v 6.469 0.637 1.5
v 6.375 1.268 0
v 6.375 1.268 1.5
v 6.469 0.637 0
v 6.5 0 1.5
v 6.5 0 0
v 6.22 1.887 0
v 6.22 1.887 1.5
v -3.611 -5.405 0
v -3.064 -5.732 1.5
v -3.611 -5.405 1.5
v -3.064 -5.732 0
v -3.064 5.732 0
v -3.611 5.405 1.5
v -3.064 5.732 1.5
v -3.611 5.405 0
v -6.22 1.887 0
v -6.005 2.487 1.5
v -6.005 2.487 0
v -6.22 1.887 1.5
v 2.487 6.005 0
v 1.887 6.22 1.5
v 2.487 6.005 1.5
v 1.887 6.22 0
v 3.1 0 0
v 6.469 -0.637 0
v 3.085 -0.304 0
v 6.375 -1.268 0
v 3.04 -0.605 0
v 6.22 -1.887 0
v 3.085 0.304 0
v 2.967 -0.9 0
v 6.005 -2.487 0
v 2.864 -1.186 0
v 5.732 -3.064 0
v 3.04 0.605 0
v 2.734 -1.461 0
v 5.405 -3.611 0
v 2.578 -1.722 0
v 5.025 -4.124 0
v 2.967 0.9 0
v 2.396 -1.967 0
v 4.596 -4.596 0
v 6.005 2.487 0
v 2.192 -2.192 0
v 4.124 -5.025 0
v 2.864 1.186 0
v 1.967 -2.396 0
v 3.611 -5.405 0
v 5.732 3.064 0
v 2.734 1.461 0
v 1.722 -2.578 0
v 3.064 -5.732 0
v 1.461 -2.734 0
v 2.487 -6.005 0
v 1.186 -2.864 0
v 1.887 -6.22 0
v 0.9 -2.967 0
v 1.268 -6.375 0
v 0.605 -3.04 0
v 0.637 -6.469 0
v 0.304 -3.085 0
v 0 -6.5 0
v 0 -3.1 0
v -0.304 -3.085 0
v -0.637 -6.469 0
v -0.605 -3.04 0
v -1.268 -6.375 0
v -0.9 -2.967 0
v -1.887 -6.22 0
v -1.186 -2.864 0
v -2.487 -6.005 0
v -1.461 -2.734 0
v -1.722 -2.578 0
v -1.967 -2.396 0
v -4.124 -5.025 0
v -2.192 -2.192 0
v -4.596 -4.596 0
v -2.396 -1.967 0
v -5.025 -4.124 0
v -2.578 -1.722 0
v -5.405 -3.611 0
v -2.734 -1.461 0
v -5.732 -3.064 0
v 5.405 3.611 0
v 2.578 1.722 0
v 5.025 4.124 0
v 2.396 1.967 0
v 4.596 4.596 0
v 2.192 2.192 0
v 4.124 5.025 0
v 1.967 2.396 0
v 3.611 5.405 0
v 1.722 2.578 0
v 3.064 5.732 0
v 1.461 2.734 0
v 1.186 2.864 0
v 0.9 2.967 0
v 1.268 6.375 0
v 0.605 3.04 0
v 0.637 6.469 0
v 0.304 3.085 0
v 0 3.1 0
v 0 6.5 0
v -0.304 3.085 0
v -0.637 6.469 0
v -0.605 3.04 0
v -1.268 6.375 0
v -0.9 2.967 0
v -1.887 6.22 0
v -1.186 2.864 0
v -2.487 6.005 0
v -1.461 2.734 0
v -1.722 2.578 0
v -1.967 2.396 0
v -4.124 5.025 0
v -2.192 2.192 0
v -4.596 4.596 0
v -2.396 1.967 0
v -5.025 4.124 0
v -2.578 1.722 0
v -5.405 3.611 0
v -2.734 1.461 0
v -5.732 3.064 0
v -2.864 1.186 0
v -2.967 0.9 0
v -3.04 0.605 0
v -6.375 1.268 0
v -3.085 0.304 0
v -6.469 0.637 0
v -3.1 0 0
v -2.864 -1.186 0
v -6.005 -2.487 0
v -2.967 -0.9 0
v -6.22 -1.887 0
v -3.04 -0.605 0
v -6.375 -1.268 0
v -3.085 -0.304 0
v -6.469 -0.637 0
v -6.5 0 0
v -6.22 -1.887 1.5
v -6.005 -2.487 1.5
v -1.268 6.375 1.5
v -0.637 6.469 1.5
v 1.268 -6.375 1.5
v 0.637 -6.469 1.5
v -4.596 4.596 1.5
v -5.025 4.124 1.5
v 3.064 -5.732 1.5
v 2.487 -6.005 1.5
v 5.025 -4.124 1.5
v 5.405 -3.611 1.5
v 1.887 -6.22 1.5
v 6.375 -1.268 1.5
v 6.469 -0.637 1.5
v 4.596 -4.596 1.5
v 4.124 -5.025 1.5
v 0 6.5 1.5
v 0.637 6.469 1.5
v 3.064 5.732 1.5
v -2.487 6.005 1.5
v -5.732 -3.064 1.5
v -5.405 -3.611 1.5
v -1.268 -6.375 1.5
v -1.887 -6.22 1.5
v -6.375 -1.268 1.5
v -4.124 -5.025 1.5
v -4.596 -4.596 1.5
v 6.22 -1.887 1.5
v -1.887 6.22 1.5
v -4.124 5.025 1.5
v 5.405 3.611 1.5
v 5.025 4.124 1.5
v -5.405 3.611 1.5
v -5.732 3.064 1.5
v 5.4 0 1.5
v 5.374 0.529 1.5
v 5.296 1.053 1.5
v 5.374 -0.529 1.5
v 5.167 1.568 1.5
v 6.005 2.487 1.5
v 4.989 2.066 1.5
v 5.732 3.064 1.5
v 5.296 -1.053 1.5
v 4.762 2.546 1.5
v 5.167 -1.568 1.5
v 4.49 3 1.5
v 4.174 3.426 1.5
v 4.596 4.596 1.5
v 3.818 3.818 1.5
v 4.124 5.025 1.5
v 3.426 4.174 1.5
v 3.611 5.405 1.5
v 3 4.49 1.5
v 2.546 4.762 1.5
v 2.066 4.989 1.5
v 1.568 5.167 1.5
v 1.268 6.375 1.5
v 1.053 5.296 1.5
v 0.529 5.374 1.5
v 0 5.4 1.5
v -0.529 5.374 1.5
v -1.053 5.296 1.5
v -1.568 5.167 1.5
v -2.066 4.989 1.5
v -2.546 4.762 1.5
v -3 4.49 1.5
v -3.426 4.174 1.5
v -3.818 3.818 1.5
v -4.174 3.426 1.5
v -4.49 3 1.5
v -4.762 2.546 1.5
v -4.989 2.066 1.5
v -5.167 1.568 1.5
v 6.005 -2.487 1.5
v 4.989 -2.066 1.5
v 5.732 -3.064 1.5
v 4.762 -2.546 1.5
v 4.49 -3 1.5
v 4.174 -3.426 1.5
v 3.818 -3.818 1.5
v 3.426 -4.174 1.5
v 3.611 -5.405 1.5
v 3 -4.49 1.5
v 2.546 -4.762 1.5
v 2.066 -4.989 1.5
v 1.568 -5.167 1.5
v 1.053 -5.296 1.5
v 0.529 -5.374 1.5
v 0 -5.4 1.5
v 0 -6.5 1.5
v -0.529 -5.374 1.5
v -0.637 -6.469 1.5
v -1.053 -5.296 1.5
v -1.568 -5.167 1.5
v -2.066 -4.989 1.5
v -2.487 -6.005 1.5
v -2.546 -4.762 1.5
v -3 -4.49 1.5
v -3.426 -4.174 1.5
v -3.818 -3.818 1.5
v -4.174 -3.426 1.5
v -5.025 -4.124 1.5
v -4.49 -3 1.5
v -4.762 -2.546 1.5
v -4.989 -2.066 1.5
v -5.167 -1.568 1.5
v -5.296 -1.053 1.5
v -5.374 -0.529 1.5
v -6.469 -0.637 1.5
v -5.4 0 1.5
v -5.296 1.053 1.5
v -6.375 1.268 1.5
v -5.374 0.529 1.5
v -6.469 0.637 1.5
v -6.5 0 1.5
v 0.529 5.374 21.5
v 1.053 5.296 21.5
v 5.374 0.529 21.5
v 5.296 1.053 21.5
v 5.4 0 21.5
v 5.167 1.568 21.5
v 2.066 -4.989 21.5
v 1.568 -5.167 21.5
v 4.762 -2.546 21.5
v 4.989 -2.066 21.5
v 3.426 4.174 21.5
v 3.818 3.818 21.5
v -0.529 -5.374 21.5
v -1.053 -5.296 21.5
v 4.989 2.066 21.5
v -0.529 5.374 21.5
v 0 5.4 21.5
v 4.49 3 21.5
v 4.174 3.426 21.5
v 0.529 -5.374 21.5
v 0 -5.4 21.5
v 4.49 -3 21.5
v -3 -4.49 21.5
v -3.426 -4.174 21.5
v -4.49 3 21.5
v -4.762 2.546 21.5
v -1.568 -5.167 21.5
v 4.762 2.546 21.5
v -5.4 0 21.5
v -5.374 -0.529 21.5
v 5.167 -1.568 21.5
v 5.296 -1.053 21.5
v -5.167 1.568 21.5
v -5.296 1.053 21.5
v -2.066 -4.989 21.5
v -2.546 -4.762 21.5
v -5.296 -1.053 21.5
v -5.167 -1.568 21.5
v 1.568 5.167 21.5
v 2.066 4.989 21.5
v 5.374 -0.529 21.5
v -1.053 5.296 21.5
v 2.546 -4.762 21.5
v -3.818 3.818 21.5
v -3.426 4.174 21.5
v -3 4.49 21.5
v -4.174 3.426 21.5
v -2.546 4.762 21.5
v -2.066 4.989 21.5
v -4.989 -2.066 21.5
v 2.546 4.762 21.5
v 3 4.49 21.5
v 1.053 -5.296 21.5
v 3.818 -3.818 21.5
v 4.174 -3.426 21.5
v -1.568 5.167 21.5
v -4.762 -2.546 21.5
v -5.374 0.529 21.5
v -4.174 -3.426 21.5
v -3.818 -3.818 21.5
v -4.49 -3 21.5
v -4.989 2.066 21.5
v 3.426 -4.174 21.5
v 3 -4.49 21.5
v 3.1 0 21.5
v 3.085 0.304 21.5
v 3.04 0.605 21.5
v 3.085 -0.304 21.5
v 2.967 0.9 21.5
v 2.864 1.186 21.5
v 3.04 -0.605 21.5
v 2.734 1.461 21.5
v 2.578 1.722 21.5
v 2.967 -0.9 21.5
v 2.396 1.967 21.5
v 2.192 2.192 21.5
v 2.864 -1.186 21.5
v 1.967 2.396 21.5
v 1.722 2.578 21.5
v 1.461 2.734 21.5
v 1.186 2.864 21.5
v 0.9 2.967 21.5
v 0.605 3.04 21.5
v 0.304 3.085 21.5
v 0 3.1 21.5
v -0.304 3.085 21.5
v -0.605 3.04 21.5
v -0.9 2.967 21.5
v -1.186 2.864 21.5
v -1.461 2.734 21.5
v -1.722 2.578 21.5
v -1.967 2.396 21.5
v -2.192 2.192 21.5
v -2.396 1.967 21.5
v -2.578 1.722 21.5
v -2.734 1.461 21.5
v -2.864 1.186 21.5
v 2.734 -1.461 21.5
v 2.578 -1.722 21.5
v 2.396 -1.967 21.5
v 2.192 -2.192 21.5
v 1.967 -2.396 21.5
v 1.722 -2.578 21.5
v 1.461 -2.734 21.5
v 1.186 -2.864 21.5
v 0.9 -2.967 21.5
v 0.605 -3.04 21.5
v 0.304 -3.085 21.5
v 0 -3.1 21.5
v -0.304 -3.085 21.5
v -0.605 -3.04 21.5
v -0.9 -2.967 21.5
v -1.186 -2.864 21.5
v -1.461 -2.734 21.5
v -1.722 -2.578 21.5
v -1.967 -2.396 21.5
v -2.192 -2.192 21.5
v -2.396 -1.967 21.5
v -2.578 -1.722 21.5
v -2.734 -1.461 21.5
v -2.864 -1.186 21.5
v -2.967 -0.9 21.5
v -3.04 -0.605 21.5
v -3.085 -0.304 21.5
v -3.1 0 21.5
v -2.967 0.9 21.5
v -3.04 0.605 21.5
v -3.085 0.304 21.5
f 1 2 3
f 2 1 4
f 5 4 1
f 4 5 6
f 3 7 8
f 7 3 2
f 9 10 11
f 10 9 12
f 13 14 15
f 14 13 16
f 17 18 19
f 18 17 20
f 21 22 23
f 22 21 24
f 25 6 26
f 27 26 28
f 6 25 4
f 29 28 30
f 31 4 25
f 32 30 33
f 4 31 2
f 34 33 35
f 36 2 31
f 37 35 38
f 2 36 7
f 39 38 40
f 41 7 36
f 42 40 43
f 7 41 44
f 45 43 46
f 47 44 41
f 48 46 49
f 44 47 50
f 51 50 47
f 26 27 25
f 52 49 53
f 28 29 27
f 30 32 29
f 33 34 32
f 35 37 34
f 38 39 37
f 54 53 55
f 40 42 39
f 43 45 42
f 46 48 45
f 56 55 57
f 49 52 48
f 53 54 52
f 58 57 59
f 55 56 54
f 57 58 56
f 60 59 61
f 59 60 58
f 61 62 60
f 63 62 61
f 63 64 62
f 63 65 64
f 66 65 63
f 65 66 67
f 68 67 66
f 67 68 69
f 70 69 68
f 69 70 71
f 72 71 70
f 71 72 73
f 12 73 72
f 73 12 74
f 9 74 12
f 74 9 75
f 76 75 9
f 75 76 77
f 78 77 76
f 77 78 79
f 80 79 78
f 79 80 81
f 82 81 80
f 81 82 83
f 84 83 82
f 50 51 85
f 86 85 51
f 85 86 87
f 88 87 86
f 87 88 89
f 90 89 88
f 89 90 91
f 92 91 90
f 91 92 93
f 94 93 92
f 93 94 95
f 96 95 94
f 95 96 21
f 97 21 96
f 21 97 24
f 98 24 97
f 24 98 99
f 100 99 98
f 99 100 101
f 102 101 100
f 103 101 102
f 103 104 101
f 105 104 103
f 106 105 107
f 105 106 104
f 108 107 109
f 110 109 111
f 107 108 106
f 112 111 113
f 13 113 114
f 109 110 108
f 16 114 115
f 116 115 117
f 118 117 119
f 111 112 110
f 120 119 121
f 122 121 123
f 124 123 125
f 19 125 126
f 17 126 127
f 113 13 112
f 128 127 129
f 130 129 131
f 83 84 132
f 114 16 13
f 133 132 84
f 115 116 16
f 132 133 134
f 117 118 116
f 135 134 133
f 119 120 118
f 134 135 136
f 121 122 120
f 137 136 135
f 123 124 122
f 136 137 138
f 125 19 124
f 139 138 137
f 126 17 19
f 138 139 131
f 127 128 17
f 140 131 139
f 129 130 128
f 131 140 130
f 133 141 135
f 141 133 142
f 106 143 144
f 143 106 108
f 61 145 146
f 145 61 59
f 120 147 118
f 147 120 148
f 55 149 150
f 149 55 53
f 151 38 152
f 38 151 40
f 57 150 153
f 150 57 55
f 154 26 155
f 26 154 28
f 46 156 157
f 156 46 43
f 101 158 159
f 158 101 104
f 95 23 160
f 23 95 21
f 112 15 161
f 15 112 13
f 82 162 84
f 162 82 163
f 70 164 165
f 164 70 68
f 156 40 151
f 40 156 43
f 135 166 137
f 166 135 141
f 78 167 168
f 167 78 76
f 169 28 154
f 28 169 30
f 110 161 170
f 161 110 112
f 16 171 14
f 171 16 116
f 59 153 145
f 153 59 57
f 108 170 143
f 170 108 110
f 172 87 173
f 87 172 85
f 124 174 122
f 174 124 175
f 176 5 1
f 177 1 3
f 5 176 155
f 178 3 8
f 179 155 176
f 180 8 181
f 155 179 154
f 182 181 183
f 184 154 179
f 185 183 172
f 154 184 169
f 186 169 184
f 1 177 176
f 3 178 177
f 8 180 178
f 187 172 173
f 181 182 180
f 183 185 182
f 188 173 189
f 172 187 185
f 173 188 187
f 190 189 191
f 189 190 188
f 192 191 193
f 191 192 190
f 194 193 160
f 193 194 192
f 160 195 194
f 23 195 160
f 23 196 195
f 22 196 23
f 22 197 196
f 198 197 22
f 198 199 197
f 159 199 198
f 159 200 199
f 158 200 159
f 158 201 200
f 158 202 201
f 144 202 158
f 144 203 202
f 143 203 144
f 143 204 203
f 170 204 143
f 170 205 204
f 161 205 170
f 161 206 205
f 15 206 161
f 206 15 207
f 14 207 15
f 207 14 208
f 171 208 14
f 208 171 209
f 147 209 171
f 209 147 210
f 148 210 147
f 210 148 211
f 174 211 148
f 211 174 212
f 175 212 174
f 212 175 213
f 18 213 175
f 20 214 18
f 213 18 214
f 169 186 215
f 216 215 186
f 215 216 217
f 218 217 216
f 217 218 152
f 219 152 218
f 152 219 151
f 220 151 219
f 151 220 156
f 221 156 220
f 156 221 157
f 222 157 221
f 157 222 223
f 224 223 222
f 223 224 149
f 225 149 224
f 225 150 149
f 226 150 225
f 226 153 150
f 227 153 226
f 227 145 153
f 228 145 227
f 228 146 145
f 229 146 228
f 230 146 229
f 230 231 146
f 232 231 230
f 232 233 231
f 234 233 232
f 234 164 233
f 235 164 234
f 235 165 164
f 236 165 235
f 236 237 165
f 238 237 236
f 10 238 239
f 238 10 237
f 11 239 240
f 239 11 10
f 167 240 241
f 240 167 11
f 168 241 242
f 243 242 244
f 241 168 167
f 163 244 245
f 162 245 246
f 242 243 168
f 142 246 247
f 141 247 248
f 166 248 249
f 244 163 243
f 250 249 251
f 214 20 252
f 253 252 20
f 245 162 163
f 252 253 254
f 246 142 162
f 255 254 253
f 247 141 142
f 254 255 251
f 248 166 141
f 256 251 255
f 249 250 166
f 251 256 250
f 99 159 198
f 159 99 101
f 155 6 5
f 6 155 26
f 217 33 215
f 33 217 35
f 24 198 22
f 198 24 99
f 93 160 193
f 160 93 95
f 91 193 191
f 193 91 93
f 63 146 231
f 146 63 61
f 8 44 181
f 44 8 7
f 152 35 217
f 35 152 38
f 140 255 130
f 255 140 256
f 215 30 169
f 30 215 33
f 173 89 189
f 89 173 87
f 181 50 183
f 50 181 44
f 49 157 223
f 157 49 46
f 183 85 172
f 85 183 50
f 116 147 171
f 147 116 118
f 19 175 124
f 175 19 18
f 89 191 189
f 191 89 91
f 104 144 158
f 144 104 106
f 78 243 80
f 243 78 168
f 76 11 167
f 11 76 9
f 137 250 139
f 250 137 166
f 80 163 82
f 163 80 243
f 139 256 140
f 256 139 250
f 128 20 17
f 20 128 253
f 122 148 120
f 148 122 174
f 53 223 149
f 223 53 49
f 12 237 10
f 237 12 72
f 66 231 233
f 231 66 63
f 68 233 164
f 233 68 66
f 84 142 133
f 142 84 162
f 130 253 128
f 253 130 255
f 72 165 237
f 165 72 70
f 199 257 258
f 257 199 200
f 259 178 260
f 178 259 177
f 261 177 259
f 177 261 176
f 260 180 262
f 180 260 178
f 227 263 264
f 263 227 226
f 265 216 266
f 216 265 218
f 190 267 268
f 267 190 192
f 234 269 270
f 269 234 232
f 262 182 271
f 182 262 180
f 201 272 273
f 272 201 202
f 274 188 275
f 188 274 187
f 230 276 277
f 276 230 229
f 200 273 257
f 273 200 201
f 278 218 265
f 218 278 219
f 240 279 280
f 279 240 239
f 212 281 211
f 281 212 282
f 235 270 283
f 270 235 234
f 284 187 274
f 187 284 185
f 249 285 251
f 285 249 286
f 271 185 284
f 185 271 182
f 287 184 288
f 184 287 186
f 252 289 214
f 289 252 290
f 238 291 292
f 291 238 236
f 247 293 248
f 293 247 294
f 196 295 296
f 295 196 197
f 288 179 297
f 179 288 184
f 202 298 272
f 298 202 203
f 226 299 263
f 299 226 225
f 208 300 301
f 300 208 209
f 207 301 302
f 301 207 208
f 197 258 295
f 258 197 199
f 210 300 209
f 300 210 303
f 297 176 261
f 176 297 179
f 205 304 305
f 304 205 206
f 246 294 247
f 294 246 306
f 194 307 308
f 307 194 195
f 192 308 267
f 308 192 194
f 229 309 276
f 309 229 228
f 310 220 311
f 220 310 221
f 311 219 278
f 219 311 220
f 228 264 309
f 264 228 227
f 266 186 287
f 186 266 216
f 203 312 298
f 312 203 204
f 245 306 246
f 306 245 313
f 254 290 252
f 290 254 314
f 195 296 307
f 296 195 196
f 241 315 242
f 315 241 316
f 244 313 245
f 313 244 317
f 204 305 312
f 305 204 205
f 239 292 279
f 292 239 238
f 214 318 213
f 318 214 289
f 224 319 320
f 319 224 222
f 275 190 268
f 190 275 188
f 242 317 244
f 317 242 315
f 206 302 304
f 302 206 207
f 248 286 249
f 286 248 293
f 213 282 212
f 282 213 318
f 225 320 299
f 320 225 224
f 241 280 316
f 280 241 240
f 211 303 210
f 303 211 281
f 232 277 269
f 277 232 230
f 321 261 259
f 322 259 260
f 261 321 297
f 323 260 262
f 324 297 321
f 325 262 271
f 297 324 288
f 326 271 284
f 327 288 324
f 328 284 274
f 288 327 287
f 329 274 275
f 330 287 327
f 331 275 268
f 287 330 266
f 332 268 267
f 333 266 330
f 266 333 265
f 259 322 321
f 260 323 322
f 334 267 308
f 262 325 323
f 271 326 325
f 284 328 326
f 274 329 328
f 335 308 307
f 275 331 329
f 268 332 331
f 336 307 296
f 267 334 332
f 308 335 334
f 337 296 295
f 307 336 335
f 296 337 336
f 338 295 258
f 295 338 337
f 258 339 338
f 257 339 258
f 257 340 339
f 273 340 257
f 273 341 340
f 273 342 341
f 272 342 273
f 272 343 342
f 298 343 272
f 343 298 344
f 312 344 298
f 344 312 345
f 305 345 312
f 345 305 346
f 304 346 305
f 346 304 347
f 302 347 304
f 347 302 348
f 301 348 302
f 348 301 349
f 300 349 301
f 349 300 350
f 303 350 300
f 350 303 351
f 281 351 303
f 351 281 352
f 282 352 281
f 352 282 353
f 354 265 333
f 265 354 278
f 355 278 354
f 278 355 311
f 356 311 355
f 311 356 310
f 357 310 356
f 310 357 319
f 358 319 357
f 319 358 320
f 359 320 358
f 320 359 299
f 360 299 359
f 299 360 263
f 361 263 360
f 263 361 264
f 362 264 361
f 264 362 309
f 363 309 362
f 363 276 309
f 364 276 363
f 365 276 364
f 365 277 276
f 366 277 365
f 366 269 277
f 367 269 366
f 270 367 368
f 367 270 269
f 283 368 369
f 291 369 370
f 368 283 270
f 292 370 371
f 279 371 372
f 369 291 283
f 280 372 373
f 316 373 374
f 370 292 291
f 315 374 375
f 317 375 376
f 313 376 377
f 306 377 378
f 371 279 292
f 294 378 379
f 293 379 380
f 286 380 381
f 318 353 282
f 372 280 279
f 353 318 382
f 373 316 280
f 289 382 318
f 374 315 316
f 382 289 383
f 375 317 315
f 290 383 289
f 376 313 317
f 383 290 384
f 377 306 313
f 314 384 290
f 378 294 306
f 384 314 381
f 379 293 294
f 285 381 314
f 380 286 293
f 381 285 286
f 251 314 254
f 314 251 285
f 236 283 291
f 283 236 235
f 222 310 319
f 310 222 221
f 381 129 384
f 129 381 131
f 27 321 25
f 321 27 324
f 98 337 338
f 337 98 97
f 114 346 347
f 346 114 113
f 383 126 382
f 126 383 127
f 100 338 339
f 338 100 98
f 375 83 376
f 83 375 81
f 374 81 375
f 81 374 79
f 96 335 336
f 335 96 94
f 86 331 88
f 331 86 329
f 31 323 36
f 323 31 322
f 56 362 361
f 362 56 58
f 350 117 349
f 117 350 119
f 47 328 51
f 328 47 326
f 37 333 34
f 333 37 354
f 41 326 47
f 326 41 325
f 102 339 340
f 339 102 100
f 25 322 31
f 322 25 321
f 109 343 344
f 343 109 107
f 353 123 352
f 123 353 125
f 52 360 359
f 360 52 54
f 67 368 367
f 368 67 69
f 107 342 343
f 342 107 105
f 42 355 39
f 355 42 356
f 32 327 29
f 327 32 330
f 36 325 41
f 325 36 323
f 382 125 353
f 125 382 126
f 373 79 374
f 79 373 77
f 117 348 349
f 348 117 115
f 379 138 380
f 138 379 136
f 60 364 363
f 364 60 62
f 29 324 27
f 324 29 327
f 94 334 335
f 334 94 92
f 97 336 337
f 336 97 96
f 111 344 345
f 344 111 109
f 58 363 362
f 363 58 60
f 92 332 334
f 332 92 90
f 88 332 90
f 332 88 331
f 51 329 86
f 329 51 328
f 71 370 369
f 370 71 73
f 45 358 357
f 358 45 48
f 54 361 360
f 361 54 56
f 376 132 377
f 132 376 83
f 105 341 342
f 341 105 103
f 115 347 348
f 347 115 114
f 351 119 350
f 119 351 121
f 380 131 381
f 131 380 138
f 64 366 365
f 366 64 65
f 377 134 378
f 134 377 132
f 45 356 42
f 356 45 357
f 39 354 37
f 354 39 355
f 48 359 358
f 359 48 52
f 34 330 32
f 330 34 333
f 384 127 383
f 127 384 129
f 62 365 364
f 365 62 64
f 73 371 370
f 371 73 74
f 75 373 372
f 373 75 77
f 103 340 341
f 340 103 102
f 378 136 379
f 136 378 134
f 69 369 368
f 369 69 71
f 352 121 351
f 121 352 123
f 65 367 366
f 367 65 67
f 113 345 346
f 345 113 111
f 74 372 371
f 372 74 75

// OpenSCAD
// PCR tube adapter sleeve: fits a 0.2 mL tube in a 1.5 mL rack hole
// Print orientation: collar on the bed (z = 0), sleeve body rises to z = 21.5

$fn = 64;

// ---- Dimensions (mm) ----
collar_d        = 13;     // collar outer diameter
collar_t        = 1.5;    // collar thickness (z = 0 to 1.5)
sleeve_od       = 10.8;   // sleeve body outer diameter
sleeve_h        = 20;     // sleeve body height above collar (z = 1.5 to 21.5)
bore_d          = 6.2;    // through-bore diameter
eps             = 0.5;    // cutter overshoot past faces

total_h = collar_t + sleeve_h;  // 22 mm overall height

difference() {
    union() {
        // Collar
        cylinder(d = collar_d, h = collar_t);
        // Sleeve body
        translate([0, 0, collar_t])
            cylinder(d = sleeve_od, h = sleeve_h);
    }
    // Through-bore
    translate([0, 0, -eps])
        cylinder(d = bore_d, h = total_h + 2 * eps);
}
